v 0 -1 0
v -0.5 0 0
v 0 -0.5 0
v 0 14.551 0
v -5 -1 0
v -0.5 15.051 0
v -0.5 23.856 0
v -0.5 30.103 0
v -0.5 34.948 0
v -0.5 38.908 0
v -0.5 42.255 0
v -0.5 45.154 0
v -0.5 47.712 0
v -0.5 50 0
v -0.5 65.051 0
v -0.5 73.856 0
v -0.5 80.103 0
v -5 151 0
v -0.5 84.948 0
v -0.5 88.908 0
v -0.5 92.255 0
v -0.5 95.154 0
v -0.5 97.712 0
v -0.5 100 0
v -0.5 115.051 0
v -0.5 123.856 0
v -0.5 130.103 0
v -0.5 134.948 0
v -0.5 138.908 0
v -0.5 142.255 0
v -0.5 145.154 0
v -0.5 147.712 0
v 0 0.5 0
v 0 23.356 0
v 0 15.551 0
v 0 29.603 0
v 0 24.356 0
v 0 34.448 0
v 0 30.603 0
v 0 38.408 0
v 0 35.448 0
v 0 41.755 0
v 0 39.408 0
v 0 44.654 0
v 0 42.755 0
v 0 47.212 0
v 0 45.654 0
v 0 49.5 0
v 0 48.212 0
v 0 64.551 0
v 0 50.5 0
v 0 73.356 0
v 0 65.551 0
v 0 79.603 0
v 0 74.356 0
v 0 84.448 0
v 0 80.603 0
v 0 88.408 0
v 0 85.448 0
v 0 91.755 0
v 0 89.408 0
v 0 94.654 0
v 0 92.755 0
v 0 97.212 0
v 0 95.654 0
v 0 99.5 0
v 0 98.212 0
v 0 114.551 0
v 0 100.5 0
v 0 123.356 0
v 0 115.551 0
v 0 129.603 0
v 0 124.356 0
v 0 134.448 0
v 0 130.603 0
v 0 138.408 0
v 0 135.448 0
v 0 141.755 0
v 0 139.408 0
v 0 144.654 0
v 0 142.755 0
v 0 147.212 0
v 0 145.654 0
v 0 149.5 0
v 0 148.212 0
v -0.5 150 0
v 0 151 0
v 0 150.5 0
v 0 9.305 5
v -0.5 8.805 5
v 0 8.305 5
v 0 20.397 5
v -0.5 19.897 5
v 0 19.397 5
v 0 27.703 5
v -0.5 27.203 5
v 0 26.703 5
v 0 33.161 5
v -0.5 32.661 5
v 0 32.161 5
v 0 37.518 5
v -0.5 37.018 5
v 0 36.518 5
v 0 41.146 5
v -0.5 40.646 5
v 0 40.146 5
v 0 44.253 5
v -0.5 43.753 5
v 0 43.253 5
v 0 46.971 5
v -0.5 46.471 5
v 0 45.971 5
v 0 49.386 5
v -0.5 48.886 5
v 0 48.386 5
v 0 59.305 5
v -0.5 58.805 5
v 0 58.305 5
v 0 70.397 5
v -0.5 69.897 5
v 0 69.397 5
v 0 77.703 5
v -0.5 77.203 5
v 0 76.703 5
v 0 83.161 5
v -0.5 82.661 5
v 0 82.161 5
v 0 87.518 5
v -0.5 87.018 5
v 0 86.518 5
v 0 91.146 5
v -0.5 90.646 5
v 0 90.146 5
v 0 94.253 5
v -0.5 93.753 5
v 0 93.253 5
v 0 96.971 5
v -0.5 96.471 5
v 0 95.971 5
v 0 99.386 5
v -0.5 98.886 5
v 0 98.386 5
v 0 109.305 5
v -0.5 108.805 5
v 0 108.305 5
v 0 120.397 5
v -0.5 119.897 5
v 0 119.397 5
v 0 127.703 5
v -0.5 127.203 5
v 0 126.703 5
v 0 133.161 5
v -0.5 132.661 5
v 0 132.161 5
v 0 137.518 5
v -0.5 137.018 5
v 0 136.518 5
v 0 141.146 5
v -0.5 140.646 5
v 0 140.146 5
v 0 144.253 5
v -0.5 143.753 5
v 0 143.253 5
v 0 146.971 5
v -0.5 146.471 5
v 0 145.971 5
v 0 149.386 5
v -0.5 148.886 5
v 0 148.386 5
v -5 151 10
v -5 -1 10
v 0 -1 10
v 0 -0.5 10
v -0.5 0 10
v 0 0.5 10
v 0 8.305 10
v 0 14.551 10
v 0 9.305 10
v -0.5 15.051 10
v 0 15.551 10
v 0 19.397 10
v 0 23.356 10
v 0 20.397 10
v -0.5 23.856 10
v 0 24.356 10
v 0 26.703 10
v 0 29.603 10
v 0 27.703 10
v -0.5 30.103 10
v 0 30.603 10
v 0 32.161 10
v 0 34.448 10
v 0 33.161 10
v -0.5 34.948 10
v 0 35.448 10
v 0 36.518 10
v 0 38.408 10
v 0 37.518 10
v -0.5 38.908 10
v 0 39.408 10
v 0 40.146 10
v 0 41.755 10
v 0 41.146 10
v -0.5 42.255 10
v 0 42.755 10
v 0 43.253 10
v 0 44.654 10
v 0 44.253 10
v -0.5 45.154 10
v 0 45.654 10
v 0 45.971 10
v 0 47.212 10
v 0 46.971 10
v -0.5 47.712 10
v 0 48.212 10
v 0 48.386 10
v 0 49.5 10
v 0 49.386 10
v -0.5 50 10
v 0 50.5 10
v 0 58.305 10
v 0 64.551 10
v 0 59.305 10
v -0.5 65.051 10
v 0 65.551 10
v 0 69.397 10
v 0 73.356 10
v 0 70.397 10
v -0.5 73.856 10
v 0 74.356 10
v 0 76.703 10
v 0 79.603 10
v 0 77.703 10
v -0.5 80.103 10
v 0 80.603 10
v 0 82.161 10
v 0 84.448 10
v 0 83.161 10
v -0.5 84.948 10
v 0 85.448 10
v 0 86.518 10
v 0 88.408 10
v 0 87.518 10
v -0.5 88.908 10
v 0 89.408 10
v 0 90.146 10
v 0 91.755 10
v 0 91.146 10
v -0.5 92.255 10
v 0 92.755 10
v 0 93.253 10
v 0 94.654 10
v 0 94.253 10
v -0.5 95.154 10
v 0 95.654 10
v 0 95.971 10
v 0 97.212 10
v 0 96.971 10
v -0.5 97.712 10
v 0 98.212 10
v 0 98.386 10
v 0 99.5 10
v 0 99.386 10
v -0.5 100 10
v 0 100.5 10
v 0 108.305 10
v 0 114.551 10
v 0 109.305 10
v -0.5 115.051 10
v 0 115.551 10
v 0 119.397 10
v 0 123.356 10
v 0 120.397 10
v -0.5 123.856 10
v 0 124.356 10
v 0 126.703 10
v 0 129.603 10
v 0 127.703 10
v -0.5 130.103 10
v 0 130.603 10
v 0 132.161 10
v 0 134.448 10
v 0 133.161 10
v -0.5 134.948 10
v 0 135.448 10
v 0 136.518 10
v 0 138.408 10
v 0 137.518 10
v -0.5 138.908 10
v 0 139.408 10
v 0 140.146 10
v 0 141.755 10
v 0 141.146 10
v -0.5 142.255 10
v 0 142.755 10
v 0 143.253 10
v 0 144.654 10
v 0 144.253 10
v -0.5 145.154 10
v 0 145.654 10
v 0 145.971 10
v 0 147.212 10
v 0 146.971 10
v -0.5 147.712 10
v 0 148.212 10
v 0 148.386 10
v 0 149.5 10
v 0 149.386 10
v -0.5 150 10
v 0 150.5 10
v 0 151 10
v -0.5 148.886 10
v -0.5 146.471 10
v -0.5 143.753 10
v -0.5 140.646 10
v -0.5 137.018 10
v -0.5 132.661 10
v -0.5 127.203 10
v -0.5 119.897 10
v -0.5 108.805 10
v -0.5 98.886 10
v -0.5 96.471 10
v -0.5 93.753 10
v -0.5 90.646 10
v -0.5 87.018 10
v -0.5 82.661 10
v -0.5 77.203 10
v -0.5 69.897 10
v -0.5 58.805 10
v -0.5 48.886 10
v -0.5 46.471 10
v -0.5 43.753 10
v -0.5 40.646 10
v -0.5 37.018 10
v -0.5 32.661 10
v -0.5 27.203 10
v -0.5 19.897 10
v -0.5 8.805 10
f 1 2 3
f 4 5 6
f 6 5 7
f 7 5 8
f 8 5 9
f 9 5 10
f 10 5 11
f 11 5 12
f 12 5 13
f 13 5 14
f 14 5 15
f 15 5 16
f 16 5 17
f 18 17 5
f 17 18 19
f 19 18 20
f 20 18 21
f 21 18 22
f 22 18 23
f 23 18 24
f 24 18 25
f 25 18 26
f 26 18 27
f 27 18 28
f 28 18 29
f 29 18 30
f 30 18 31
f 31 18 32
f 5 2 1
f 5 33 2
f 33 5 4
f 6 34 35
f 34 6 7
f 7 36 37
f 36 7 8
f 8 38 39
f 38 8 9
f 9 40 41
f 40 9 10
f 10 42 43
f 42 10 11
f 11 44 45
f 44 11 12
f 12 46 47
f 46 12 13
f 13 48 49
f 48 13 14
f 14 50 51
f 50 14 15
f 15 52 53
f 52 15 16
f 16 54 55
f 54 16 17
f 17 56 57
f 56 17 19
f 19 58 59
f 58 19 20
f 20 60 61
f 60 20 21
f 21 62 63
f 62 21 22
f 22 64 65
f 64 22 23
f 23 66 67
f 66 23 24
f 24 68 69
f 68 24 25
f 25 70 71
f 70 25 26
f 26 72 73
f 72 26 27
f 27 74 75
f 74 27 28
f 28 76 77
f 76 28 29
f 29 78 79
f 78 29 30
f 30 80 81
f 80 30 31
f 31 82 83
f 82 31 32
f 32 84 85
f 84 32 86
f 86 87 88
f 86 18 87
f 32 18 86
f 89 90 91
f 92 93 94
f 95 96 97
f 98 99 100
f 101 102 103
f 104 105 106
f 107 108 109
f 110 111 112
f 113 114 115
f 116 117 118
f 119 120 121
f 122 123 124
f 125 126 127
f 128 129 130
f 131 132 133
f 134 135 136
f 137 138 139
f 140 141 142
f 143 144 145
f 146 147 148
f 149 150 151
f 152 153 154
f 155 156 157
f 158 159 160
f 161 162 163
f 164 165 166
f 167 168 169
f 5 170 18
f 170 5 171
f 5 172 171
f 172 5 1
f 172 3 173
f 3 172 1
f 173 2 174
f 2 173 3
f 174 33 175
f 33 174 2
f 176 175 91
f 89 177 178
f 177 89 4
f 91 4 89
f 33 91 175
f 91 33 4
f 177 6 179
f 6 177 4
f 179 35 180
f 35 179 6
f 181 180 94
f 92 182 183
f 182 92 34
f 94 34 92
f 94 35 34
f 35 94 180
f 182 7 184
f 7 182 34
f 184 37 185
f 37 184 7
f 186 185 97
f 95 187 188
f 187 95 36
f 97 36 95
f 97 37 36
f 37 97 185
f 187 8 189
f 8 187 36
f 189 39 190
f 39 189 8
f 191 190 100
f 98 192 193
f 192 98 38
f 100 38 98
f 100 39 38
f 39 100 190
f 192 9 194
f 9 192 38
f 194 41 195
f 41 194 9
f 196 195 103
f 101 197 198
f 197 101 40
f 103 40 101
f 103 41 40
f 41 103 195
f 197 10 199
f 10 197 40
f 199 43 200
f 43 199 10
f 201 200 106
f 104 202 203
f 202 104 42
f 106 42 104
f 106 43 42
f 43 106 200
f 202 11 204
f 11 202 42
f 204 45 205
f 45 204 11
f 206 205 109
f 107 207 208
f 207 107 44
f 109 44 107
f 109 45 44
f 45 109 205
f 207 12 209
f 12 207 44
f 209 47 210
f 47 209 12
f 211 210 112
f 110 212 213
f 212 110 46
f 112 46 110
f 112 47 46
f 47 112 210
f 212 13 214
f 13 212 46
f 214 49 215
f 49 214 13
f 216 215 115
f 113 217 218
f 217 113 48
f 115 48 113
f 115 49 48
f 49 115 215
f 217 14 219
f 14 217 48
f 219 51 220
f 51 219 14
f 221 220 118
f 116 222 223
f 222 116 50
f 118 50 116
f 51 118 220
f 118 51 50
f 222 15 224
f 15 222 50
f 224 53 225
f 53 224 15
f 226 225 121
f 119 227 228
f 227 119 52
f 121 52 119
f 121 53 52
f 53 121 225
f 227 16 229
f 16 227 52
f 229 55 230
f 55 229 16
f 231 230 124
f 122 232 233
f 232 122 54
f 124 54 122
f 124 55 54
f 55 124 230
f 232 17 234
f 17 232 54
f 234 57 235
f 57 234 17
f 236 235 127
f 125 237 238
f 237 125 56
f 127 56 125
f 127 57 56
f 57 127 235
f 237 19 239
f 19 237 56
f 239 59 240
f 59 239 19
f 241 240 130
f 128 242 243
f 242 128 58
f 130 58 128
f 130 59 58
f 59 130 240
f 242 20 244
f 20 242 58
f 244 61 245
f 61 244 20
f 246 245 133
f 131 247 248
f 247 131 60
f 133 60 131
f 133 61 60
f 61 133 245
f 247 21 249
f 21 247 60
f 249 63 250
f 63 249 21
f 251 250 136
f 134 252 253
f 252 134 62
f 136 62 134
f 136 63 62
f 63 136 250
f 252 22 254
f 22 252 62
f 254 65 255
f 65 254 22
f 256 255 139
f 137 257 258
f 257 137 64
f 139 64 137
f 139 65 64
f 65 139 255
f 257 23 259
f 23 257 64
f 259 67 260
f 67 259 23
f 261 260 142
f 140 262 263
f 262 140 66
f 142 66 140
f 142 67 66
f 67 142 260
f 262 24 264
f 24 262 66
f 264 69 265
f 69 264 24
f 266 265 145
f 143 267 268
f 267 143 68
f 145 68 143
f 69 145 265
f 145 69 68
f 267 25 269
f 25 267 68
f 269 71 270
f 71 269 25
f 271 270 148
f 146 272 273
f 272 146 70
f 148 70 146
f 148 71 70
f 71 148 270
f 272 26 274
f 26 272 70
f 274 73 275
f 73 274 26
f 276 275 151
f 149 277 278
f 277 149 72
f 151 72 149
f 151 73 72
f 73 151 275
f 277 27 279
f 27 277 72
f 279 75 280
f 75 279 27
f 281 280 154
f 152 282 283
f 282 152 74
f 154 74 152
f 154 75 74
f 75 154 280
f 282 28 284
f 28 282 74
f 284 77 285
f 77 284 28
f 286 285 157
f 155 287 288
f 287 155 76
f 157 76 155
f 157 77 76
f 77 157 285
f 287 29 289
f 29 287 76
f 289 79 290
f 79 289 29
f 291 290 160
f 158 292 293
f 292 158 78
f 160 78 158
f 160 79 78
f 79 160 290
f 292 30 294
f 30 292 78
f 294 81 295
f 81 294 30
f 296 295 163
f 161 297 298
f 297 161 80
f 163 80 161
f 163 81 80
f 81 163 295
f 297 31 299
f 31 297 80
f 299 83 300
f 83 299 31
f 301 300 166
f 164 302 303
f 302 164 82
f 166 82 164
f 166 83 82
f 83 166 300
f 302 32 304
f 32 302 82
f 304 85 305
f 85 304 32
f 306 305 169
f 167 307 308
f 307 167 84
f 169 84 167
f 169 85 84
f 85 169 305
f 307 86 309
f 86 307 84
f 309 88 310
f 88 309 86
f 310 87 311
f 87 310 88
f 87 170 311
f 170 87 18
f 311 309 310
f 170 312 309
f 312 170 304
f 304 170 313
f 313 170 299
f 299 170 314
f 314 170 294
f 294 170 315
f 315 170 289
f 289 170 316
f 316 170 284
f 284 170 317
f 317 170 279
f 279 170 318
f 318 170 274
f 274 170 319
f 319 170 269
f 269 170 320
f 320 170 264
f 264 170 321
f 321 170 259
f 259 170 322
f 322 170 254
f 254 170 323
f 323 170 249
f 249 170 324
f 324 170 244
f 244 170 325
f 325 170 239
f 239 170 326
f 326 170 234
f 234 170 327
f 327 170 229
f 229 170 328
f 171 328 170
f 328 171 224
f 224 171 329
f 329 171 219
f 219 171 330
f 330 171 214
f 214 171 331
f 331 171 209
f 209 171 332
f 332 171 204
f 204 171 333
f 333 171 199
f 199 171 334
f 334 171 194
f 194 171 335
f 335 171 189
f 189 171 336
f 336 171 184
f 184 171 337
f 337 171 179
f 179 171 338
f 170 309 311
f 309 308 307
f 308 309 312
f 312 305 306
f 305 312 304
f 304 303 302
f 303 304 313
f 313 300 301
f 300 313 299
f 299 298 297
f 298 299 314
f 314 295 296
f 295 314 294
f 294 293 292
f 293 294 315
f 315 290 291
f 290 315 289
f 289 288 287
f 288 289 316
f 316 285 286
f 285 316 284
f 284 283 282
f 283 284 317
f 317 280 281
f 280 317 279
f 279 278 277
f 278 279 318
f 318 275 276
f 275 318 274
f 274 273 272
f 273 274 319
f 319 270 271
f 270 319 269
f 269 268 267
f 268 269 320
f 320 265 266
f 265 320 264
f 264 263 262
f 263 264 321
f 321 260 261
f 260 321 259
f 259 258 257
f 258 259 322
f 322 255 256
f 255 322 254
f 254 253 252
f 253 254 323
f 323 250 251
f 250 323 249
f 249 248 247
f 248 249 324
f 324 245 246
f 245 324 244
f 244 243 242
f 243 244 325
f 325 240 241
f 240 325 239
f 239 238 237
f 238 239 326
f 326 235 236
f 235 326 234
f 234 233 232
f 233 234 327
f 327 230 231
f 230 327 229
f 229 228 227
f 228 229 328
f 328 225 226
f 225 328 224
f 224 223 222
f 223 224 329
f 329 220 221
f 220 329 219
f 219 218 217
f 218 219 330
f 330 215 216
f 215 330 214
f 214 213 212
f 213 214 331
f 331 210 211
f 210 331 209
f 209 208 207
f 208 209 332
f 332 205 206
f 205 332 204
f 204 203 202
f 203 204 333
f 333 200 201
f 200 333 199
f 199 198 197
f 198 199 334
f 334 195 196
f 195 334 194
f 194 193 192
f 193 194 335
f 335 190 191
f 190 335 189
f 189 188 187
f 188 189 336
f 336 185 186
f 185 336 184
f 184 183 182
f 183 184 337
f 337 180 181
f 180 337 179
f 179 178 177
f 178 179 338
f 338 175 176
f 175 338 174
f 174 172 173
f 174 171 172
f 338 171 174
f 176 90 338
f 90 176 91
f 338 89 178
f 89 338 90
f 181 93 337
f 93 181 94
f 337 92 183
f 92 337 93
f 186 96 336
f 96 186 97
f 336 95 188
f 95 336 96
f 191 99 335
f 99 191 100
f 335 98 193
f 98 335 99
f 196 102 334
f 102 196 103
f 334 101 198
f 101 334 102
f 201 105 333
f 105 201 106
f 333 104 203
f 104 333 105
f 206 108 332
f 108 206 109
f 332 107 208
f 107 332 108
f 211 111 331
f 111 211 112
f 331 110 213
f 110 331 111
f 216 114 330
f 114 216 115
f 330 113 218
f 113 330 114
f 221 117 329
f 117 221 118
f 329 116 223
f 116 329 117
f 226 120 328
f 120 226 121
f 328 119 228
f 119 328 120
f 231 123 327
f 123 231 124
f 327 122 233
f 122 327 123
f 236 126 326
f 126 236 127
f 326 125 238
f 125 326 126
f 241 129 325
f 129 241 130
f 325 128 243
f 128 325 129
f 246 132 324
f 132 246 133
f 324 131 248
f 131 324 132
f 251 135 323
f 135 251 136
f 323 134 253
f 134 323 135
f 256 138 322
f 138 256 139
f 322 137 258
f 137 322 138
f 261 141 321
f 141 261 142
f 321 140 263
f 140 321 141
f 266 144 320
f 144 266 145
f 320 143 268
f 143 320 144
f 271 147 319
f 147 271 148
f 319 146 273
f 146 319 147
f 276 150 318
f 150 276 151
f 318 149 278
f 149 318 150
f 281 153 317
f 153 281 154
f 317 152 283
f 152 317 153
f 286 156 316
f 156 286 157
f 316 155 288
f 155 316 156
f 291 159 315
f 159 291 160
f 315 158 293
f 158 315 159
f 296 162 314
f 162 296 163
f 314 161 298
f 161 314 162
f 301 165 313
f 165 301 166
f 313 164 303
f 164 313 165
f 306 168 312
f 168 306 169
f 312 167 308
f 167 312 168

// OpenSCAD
// File rootfinder.scad 
// (c) 2023 Rich Cameron, for the book Make:Trigonometry
// Licensed under a Creative Commons, Attribution,
// CC-BY 4.0 international license, per
// https://creativecommons.org/licenses/by/4.0/
// Attribute to Rich Cameron, at
// repository github.com/whosawhatsis/Trigonometry

2d = false;
max = 10;
scale = 150;
root = 3;
w = 5;
h = 10;
notch = .5;

rotate(90) if(2d) difference() {
	translate([-1, 0, 0]) square([scale + 2, h]);
	#union() for (j = [0:root - 1], i = [1:max]) {
		translate([(scale / root) * (log(i) + j), h, 0]) square([.0001, h], center = true);
	}
	#union() for (j = [0:root - 1], i = [1:.5:max]) {
		translate([(scale / root) * (log(i) + j), h, 0]) square([.0001, h / 2], center = true);
	}
} else {
	linear_extrude(h / 2) difference() {
		translate([-1, 0, 0]) square([scale + 2, w]);
		union() for (j = [0:root - 1], i = [1:max]) {
			translate([(scale / root) * (log(i) + j), 0, 0]) circle(notch, $fn = 4);
		}
	}
	linear_extrude(h) difference() {
		translate([-1, 0, 0]) square([scale + 2, w]);
		union() for (j = [0:root - 1], i = [1:.5:max]) {
			translate([(scale / root) * (log(i) + j), 0, 0]) circle(notch, $fn = 4);
		}
	}
}
